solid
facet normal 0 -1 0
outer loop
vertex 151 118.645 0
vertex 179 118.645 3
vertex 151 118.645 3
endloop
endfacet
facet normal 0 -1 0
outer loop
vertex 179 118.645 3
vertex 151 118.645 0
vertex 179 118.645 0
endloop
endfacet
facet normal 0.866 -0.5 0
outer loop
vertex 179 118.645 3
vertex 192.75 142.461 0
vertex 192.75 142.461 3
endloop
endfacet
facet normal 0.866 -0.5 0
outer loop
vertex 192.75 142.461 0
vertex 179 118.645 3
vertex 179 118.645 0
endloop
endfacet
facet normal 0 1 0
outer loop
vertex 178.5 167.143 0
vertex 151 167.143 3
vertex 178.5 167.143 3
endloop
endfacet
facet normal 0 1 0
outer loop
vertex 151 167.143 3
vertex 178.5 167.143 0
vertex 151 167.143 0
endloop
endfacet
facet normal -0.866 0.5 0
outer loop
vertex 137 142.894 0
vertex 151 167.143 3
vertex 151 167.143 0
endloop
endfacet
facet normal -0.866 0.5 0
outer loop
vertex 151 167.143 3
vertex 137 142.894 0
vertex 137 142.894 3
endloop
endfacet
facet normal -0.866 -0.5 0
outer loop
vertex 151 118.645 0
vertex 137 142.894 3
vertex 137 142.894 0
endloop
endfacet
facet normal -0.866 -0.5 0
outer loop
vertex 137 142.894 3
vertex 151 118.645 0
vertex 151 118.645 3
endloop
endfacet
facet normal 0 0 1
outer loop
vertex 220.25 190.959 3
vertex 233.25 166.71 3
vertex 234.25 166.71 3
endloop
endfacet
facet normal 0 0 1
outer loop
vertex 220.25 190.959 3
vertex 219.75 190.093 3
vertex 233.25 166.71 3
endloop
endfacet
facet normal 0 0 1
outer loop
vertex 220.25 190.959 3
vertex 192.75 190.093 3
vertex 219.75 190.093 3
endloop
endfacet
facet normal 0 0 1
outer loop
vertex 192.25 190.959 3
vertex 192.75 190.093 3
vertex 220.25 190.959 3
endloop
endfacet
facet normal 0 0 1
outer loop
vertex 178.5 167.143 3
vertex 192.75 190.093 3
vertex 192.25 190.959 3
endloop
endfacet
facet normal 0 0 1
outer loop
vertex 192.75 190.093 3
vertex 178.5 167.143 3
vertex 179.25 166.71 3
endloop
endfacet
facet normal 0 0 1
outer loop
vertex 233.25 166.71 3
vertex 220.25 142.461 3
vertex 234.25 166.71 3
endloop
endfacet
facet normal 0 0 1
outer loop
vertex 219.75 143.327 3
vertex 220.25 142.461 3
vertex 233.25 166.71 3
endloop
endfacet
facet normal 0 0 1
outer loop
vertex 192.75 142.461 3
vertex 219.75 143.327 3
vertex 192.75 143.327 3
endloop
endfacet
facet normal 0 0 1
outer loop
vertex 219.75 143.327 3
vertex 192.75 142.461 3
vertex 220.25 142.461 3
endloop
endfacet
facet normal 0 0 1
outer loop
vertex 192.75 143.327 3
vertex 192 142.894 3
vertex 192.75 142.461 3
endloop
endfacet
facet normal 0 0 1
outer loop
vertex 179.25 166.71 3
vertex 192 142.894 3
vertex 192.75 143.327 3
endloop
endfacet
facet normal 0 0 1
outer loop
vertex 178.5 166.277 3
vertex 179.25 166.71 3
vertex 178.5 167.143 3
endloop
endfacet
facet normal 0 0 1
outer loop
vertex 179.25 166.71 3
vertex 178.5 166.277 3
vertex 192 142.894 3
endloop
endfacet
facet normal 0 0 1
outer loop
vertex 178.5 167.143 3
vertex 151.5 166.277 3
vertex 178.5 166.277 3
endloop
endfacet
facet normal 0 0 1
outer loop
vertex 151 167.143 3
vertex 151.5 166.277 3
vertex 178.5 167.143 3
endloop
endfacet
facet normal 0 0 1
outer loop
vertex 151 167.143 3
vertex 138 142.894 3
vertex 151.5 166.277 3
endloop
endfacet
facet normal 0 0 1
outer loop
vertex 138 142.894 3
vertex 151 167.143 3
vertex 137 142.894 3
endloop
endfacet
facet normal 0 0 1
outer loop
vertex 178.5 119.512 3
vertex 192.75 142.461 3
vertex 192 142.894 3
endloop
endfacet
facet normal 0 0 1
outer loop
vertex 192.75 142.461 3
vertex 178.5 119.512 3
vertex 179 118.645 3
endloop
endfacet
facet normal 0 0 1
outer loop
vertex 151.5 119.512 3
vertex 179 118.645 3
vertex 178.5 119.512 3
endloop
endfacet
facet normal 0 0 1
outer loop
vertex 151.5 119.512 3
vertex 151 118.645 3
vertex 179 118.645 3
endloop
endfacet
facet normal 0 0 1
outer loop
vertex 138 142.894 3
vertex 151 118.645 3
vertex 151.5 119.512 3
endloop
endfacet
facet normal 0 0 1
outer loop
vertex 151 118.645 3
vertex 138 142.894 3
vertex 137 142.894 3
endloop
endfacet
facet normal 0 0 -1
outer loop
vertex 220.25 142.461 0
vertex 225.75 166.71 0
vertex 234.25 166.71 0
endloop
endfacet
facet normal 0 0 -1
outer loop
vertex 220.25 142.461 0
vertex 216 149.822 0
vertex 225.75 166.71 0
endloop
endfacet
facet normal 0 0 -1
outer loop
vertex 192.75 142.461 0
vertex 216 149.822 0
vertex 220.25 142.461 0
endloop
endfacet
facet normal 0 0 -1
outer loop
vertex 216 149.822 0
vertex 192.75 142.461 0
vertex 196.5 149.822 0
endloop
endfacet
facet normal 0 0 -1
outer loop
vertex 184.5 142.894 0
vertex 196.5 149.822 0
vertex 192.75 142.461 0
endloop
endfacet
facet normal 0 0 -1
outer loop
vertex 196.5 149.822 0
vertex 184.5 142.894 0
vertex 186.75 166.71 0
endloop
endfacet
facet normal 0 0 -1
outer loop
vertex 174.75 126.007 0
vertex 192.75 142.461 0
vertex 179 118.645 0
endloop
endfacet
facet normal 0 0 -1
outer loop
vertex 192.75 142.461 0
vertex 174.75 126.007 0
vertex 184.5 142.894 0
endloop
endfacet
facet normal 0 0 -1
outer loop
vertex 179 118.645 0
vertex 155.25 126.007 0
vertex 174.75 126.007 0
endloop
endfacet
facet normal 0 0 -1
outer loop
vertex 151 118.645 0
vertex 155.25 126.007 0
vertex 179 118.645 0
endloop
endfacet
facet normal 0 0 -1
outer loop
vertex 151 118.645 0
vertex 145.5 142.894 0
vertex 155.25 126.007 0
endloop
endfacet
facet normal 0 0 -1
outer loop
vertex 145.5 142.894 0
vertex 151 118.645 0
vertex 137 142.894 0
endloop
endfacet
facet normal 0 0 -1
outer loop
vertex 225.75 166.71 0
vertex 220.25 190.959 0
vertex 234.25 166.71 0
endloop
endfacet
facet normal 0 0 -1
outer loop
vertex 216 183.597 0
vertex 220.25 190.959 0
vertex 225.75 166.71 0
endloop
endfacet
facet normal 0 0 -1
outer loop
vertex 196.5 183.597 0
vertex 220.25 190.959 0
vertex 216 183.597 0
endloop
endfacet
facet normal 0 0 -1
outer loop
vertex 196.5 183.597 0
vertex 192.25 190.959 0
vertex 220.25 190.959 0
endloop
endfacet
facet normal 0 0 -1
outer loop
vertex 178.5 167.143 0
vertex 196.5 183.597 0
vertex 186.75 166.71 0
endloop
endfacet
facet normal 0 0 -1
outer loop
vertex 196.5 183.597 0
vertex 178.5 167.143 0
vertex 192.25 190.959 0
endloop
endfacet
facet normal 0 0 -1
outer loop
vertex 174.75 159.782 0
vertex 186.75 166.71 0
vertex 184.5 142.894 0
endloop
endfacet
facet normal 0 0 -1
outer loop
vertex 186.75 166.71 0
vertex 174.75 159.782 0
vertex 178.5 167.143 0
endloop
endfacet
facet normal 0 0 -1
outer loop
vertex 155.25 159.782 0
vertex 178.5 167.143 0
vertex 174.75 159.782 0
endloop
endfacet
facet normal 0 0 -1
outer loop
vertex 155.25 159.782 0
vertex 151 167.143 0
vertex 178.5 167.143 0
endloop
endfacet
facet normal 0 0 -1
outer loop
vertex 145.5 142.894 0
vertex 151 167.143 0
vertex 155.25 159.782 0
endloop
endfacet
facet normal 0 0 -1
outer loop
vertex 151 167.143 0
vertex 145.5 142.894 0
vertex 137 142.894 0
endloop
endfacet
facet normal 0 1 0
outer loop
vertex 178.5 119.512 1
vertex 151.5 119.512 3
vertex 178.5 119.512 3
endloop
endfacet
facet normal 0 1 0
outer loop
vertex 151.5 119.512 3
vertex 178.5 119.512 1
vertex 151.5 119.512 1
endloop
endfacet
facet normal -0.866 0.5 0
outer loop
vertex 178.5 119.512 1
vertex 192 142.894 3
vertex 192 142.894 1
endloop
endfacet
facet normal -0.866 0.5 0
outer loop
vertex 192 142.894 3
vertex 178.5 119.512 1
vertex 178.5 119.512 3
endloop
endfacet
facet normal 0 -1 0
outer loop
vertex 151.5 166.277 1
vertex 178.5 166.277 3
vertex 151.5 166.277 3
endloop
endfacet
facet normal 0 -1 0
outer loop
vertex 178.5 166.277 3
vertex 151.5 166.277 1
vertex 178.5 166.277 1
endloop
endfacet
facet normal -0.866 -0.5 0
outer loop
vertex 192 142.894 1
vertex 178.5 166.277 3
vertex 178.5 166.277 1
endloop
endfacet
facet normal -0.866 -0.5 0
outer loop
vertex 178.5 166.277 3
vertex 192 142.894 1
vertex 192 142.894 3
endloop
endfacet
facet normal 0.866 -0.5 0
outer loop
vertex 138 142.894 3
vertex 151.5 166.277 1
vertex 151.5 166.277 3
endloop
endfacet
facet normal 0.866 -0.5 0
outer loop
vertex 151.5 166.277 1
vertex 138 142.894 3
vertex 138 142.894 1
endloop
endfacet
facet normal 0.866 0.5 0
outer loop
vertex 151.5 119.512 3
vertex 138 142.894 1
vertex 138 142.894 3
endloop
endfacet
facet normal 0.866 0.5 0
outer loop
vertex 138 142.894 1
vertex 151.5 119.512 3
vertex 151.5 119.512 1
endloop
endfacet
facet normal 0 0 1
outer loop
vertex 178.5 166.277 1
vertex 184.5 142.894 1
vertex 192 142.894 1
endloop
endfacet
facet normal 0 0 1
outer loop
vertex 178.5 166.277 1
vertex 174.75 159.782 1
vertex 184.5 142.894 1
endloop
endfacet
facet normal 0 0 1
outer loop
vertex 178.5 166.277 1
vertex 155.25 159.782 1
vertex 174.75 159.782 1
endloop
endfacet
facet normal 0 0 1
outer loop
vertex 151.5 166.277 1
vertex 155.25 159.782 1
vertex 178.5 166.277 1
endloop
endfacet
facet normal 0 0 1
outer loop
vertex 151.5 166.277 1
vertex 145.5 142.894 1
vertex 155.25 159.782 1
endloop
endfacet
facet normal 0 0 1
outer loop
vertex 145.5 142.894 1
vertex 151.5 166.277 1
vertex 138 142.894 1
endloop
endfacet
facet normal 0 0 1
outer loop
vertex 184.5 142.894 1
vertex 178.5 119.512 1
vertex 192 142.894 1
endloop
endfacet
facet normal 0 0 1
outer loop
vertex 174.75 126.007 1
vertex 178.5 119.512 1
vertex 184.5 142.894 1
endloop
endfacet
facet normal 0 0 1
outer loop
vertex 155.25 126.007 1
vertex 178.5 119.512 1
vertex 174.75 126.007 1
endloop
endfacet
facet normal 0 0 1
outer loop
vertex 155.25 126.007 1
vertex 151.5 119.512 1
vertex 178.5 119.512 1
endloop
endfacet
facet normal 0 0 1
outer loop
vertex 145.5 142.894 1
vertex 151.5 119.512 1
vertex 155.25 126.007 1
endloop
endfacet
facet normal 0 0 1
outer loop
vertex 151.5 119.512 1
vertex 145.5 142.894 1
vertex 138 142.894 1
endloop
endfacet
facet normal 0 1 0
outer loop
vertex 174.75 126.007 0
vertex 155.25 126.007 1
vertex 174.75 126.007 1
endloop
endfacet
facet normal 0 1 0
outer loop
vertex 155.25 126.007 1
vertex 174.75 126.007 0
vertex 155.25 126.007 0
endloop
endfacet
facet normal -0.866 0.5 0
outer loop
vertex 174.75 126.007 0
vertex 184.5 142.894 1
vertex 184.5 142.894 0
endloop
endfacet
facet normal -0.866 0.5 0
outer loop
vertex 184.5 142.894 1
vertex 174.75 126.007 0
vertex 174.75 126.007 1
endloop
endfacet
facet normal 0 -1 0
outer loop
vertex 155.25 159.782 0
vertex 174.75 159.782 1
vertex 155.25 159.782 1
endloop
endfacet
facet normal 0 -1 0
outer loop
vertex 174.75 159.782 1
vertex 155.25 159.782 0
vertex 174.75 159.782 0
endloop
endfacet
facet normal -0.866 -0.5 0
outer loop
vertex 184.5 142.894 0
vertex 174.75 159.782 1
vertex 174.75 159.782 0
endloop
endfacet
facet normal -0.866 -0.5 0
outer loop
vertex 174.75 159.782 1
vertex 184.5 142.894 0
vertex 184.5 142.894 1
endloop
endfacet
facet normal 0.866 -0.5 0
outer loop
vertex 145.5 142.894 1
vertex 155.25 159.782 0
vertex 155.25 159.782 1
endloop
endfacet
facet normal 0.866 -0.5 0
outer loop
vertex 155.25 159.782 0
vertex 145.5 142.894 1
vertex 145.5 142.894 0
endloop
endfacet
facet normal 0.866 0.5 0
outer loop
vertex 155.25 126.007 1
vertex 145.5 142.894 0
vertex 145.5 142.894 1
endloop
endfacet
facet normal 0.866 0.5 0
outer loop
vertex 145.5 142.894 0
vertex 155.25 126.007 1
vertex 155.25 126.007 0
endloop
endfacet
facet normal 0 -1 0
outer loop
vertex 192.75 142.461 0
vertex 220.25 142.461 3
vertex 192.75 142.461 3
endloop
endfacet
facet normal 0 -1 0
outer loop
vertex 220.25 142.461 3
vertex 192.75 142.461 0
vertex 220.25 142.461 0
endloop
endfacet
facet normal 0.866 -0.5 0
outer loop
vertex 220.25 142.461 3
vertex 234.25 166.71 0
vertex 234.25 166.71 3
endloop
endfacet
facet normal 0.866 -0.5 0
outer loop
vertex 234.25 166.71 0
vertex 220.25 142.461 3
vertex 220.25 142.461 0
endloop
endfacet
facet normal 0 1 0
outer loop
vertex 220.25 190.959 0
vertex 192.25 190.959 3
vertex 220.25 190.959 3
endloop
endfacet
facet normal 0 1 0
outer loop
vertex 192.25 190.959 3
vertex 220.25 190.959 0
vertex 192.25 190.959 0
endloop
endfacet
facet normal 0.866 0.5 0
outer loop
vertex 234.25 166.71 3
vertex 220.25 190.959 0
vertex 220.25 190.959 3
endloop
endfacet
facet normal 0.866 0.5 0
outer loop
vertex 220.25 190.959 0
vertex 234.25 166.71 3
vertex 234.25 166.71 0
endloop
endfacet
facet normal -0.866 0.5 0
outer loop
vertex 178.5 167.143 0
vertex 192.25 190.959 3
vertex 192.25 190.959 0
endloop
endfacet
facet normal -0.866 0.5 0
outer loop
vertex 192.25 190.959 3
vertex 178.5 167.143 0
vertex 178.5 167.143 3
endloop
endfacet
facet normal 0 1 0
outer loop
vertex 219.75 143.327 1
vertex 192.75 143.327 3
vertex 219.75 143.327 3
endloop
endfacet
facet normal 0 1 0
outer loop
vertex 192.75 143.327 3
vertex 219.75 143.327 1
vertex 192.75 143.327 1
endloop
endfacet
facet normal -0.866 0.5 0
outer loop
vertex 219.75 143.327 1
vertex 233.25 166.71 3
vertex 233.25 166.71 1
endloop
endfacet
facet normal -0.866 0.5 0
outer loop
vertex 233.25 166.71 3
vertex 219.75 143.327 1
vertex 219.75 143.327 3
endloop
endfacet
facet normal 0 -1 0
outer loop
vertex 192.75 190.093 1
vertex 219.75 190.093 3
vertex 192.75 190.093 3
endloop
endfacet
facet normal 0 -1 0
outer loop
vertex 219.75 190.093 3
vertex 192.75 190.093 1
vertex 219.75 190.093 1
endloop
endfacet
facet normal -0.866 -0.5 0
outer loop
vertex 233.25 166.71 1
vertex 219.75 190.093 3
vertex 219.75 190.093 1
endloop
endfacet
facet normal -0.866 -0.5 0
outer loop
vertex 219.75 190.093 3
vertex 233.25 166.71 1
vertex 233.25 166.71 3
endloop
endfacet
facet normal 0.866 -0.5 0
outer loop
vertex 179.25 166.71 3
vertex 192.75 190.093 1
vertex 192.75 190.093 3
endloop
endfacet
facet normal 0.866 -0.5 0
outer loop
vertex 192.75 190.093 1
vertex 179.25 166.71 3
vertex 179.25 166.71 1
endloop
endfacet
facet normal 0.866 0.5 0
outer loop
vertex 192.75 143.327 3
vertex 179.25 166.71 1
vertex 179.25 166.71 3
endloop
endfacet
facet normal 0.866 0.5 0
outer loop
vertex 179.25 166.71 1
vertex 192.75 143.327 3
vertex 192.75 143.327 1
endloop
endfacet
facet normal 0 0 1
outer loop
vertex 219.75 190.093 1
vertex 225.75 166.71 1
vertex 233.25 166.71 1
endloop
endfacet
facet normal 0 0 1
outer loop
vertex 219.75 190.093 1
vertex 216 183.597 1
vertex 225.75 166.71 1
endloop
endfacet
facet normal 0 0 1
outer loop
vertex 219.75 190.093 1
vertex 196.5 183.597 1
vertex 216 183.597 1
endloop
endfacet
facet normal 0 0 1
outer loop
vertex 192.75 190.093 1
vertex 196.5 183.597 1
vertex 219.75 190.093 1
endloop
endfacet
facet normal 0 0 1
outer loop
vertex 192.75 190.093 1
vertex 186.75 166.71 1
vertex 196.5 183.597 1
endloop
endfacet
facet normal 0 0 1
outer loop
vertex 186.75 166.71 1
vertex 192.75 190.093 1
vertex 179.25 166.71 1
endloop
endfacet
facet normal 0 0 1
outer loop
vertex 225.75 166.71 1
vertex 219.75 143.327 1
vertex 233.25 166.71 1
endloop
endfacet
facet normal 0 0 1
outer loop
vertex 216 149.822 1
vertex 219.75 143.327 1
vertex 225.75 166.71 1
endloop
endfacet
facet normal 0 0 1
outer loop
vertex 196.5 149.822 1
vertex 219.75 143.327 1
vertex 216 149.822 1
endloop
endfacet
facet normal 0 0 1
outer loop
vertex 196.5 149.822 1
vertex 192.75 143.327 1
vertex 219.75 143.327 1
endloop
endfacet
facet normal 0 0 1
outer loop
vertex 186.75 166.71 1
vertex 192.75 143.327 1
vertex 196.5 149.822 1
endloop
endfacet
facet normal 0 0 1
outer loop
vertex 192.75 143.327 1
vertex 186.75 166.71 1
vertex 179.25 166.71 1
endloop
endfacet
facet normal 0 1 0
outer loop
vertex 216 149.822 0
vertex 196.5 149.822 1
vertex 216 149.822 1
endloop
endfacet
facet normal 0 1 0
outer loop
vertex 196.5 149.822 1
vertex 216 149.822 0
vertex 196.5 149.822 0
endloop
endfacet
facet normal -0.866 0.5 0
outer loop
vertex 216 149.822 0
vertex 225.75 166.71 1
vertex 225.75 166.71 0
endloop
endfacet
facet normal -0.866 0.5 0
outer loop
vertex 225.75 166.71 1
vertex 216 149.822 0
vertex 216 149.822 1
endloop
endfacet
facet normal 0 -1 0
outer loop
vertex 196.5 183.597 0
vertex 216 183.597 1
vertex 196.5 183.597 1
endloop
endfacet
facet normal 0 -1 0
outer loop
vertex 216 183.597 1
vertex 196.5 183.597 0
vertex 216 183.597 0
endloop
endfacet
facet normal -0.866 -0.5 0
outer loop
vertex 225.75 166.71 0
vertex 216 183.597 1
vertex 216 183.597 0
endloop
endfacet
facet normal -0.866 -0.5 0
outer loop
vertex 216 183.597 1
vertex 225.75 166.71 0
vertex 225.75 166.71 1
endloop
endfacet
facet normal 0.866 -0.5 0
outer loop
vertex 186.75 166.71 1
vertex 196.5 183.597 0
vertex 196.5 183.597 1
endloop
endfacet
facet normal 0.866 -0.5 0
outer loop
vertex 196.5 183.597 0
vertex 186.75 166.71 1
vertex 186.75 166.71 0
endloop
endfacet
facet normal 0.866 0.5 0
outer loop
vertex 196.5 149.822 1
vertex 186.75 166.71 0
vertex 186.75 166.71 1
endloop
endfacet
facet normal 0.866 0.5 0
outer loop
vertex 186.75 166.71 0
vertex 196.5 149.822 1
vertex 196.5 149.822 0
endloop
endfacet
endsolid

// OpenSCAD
$fn = 150;

union() {
	translate(v = [165.0, 142.89419162443238, 0]) {
		difference() {
			cylinder($fn = 6, d = 56.0, h = 3.0);
			translate(v = [0, 0, 1.0]) {
				cylinder($fn = 6, d = 54.0, h = 3.0);
			}
			translate(v = [0, 0, -1]) {
				cylinder($fn = 6, d = 39, h = 3.0);
			}
		}
	}
	translate(v = [206.25, 166.70989022850443, 0]) {
		difference() {
			cylinder($fn = 6, d = 56.0, h = 3.0);
			translate(v = [0, 0, 1.0]) {
				cylinder($fn = 6, d = 54.0, h = 3.0);
			}
			translate(v = [0, 0, -1]) {
				cylinder($fn = 6, d = 39, h = 3.0);
			}
		}
	}
}
